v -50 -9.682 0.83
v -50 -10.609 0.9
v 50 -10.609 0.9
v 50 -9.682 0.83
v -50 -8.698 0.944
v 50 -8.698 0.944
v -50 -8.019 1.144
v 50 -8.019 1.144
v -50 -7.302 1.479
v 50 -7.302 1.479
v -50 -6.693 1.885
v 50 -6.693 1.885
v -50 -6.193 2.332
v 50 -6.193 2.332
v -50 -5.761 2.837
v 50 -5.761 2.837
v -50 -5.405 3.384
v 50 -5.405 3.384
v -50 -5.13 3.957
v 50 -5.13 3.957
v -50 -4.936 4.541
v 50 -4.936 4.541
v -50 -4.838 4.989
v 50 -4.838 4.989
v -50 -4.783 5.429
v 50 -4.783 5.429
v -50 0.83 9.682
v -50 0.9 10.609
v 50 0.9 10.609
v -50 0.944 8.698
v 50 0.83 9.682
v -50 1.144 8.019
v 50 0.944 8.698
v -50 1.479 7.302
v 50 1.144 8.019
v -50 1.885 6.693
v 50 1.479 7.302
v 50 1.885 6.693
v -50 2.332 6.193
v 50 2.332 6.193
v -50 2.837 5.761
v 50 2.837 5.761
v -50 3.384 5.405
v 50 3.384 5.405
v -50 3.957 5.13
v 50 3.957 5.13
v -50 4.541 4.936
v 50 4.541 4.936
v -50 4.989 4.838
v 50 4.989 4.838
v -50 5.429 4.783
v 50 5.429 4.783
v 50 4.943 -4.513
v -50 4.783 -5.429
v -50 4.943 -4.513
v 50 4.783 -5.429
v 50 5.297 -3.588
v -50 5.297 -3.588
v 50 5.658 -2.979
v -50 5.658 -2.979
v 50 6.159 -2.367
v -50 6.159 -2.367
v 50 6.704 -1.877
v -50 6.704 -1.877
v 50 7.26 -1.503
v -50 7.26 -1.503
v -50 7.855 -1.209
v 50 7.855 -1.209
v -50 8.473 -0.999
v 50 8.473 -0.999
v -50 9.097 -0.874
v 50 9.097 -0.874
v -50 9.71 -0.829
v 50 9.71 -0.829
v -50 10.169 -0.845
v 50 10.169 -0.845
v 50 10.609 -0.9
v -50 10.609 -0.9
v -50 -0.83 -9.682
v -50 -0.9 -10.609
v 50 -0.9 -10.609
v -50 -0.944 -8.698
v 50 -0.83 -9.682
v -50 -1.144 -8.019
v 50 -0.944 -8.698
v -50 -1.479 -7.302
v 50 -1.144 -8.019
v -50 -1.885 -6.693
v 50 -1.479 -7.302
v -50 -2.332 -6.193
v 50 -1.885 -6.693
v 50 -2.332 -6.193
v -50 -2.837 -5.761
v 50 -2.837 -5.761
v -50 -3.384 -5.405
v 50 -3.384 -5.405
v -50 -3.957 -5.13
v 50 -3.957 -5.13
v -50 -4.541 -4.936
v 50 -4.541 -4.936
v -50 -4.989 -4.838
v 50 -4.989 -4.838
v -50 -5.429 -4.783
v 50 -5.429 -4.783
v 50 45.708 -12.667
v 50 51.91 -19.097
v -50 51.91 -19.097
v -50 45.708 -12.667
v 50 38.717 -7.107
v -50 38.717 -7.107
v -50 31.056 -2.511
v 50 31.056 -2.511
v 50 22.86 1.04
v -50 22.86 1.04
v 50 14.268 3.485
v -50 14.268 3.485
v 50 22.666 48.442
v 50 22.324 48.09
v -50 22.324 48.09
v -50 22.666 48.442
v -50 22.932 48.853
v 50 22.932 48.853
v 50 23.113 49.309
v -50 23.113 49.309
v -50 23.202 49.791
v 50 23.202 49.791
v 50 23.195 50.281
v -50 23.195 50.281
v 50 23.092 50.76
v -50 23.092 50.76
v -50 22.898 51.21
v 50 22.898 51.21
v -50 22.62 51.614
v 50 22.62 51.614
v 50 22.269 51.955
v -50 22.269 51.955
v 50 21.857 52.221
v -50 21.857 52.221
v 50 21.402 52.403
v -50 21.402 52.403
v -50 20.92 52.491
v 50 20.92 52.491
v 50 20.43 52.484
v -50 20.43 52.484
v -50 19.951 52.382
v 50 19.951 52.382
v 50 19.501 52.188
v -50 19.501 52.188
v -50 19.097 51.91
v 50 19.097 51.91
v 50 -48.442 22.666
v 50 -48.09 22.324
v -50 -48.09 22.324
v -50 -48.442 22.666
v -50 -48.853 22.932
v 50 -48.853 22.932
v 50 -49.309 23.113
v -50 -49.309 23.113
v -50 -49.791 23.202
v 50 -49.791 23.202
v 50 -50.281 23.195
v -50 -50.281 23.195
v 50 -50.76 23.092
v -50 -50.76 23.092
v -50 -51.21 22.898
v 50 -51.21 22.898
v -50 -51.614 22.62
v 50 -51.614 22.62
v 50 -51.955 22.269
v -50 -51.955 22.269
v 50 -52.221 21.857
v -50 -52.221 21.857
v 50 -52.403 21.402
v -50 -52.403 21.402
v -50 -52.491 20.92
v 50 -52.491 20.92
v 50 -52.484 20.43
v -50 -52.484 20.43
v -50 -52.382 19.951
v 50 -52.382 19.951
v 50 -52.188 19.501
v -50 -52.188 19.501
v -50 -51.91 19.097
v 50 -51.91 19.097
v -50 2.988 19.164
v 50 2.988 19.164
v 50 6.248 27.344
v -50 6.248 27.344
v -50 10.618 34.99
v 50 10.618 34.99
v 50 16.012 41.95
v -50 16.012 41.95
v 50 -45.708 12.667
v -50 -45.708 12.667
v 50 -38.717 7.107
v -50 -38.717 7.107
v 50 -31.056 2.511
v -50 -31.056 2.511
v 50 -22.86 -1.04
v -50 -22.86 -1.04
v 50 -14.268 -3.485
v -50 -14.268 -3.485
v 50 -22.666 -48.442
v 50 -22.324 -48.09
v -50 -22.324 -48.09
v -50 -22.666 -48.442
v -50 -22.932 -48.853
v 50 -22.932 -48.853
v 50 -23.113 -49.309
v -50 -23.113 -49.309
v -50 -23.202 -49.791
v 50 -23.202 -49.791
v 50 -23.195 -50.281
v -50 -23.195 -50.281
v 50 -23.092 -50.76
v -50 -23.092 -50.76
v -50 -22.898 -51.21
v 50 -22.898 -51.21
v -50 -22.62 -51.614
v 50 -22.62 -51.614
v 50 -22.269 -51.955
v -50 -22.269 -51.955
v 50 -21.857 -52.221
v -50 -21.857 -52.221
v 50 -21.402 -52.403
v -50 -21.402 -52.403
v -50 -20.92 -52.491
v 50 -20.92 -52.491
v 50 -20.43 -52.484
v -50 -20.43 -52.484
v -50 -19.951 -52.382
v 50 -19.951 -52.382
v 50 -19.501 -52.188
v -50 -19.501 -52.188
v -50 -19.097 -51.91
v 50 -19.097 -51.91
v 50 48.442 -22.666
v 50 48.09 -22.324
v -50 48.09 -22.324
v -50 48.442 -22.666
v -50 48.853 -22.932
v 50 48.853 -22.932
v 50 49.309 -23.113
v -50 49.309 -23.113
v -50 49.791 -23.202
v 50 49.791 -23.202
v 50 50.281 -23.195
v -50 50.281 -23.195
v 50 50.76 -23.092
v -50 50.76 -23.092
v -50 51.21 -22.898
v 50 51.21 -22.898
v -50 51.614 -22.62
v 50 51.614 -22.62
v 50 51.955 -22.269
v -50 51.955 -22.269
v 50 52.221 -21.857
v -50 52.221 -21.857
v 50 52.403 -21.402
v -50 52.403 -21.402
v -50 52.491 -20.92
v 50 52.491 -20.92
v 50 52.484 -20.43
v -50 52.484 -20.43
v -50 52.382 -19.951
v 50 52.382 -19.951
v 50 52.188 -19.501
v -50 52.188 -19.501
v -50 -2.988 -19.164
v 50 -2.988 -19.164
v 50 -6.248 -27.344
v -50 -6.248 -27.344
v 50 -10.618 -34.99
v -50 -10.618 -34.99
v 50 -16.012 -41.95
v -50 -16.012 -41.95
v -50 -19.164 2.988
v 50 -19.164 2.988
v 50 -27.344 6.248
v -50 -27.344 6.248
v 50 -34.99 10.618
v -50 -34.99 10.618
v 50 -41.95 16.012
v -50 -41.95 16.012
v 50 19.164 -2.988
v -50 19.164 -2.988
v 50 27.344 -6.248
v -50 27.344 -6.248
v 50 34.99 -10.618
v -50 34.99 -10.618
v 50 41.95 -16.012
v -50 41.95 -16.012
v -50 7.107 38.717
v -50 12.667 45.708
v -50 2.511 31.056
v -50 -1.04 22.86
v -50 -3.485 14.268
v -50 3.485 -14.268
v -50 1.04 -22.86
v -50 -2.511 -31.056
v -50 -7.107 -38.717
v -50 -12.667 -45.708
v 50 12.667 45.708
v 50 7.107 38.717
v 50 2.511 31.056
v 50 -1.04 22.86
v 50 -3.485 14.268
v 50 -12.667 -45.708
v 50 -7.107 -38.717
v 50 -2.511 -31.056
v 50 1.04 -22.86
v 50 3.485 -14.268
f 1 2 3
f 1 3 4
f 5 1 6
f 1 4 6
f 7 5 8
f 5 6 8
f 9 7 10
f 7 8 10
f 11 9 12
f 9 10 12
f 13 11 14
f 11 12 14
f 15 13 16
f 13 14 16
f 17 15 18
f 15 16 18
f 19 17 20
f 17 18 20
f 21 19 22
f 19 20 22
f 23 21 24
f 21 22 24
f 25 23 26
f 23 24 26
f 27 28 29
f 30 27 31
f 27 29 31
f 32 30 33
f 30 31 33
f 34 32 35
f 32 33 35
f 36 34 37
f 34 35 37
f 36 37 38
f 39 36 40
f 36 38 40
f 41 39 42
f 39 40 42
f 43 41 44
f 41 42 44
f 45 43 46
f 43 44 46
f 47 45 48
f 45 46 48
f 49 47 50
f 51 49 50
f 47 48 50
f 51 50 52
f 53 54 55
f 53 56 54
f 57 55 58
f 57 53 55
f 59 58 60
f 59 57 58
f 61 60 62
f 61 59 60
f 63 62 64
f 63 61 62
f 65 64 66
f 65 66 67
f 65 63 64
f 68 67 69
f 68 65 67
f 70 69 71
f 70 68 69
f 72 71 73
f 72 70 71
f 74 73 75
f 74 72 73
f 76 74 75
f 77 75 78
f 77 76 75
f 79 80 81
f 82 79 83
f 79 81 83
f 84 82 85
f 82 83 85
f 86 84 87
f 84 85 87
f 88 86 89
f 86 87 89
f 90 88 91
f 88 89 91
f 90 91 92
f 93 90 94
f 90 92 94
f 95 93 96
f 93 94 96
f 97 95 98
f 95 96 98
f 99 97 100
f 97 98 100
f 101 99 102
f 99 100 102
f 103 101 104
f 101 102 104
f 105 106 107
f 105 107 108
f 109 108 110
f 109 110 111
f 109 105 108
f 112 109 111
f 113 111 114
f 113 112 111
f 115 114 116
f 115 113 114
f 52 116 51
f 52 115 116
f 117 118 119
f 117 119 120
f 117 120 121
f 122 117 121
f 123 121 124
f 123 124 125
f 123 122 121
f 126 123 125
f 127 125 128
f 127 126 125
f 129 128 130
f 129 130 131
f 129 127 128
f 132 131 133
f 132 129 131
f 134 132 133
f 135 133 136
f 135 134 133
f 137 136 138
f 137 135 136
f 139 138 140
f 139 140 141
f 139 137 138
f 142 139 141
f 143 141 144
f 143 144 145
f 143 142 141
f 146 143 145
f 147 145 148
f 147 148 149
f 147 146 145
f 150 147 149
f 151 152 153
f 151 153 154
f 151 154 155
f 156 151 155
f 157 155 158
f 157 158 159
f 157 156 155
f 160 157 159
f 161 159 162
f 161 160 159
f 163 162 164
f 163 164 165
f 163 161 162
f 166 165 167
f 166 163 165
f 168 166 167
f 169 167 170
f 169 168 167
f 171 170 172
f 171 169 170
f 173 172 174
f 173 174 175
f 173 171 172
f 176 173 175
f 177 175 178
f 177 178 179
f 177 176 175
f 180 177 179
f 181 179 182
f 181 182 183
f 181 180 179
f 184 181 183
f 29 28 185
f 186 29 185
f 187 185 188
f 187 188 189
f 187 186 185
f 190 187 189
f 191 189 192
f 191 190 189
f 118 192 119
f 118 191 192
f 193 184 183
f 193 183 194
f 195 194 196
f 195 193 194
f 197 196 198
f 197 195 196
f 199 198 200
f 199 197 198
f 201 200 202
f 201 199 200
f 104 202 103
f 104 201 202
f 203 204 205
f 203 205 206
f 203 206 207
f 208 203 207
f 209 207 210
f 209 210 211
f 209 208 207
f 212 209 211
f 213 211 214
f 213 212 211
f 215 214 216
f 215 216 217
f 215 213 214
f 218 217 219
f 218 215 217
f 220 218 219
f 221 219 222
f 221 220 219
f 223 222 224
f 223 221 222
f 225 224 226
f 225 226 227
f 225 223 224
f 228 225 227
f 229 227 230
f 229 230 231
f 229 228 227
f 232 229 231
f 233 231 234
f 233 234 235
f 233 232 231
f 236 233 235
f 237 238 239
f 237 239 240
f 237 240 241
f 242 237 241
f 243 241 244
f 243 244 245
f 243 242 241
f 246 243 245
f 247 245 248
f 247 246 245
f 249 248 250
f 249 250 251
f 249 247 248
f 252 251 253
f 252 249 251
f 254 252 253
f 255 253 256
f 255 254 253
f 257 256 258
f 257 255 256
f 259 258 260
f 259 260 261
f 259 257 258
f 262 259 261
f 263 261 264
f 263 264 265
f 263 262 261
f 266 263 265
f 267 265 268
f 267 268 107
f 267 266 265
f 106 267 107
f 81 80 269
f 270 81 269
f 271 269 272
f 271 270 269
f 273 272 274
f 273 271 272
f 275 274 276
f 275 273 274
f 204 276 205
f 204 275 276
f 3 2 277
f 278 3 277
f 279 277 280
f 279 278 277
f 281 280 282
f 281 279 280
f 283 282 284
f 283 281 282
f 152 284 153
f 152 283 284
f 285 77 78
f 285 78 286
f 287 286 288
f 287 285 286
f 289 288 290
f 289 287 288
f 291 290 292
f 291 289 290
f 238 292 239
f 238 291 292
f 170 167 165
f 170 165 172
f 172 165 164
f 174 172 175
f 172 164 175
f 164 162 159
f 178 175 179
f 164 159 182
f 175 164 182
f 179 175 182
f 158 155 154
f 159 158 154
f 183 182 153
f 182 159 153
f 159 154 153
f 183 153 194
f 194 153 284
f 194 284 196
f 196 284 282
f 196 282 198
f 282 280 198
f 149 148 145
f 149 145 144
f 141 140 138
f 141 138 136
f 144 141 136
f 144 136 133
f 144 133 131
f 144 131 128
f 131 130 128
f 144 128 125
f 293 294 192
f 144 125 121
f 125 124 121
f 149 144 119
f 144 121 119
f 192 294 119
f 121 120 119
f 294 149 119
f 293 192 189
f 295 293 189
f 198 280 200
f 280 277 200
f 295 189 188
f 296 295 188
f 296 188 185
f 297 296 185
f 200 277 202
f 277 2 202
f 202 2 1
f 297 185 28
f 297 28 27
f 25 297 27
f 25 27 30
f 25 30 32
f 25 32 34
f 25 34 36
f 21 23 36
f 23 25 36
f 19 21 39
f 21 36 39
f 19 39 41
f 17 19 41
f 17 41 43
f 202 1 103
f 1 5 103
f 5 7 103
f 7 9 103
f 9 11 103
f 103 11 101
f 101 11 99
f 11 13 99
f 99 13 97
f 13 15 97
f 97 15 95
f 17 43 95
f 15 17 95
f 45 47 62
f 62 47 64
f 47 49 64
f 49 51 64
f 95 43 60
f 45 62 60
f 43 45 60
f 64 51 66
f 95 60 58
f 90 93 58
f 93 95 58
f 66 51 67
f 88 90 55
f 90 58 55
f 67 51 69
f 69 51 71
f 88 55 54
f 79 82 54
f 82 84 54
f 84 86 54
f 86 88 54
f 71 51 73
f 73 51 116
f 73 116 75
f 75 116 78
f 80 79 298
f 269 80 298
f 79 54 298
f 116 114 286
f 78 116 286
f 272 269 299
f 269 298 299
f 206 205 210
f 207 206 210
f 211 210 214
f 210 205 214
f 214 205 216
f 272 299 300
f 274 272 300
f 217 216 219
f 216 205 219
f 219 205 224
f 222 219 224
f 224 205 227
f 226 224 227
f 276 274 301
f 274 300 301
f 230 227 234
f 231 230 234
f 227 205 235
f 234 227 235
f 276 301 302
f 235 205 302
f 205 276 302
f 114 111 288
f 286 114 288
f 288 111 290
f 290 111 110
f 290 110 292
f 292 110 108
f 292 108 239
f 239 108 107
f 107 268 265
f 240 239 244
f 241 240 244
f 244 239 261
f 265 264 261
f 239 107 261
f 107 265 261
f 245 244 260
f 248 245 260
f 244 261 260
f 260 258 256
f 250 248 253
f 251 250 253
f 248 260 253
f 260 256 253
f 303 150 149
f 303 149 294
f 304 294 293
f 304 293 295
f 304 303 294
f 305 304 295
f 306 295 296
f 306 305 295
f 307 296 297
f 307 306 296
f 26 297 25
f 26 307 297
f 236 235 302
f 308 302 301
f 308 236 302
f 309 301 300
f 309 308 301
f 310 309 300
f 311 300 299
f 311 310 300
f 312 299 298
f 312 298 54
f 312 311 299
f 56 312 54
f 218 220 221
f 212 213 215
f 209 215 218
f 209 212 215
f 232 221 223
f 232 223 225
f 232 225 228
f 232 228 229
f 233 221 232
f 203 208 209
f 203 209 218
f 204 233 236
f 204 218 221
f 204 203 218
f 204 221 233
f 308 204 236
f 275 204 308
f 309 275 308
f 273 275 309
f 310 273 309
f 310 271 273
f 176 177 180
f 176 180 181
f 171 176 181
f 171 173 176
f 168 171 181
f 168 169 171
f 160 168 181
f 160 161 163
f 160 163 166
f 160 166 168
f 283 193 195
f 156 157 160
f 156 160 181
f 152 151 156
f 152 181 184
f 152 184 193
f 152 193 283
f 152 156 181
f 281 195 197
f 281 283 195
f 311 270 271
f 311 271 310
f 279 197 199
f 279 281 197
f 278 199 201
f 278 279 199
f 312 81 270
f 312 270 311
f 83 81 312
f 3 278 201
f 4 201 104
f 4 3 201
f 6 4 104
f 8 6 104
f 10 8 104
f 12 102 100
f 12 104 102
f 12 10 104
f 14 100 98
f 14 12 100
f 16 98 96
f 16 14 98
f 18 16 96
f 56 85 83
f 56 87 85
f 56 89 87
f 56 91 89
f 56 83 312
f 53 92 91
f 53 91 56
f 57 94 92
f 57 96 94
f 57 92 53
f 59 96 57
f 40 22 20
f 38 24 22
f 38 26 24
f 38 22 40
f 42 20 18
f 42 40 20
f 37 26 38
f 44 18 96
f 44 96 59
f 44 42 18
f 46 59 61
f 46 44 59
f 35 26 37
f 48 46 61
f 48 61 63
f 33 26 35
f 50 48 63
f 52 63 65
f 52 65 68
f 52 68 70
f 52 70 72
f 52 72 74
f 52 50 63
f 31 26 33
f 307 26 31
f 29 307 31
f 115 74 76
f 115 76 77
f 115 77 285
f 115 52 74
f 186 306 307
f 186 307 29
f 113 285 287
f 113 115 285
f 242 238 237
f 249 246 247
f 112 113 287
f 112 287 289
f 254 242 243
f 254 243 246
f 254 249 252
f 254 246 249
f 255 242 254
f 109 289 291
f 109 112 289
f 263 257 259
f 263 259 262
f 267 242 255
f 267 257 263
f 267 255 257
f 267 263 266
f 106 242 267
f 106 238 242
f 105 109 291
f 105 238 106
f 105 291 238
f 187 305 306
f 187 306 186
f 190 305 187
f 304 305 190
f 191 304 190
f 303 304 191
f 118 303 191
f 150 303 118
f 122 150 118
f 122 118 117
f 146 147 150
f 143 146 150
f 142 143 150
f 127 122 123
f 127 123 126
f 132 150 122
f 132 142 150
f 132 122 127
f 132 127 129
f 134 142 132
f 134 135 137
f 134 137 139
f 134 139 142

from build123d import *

# Parameters (mm, degrees)
F1_DEPTH = 50
F3_COUNT = 4
F4_R     = 5


with BuildPart() as f1:
    # F0 (on Right) → F1 (new body, symmetric)
    with BuildSketch(Plane.YZ):
        with BuildLine():
            ThreePointArc((4.996056664, -0.1985391896), (28.756397628, -6.9508107655), (48.0904328859, -22.324231166))
            ThreePointArc((48.0904328859, -22.324231166), (51.6135530474, -22.6202452328), (51.9095671141, -19.0971250713))
            ThreePointArc((51.9095671141, -19.0971250713), (28.6150074029, -1.3179590775), (0, 5))
            ThreePointArc((0, 5), (3.5355339059, 3.5355339059), (5, 0))
            ThreePointArc((5, 0), (4.9990140688, -0.0992891732), (4.996056664, -0.1985391896))
        make_face()
        with BuildLine():
            ThreePointArc((0, 5), (-3.605044795, -3.4646286996), (4.996056664, -0.1985391896))
            ThreePointArc((4.996056664, -0.1985391896), (4.9990140688, -0.0992891732), (5, 0))
            ThreePointArc((5, 0), (3.5355339059, 3.5355339059), (0, 5))
        make_face()
    extrude(amount=F1_DEPTH, both=True)

    # F3: F1 ×4 about axis
    f3_axis = Axis((20.0893953443, 0, 0), (1, 0, 0))


with BuildPart() as f1_1:
    add(f1.part)
    for i in range(1, F3_COUNT):
        add(f1.part.rotate(f3_axis, i * 360 / F3_COUNT))

    # F4
    f4_edges = [f1_1.edges().sort_by_distance(p)[0] for p in [
        (0, 4.999709, -0.19883),
        (0, -0.19883, -4.999709),
        (0, -4.999709, 0.19883),
        (0, 0.19883, 4.999709),
    ]]
    fillet(f4_edges, radius=F4_R)


solid = f1_1.part
